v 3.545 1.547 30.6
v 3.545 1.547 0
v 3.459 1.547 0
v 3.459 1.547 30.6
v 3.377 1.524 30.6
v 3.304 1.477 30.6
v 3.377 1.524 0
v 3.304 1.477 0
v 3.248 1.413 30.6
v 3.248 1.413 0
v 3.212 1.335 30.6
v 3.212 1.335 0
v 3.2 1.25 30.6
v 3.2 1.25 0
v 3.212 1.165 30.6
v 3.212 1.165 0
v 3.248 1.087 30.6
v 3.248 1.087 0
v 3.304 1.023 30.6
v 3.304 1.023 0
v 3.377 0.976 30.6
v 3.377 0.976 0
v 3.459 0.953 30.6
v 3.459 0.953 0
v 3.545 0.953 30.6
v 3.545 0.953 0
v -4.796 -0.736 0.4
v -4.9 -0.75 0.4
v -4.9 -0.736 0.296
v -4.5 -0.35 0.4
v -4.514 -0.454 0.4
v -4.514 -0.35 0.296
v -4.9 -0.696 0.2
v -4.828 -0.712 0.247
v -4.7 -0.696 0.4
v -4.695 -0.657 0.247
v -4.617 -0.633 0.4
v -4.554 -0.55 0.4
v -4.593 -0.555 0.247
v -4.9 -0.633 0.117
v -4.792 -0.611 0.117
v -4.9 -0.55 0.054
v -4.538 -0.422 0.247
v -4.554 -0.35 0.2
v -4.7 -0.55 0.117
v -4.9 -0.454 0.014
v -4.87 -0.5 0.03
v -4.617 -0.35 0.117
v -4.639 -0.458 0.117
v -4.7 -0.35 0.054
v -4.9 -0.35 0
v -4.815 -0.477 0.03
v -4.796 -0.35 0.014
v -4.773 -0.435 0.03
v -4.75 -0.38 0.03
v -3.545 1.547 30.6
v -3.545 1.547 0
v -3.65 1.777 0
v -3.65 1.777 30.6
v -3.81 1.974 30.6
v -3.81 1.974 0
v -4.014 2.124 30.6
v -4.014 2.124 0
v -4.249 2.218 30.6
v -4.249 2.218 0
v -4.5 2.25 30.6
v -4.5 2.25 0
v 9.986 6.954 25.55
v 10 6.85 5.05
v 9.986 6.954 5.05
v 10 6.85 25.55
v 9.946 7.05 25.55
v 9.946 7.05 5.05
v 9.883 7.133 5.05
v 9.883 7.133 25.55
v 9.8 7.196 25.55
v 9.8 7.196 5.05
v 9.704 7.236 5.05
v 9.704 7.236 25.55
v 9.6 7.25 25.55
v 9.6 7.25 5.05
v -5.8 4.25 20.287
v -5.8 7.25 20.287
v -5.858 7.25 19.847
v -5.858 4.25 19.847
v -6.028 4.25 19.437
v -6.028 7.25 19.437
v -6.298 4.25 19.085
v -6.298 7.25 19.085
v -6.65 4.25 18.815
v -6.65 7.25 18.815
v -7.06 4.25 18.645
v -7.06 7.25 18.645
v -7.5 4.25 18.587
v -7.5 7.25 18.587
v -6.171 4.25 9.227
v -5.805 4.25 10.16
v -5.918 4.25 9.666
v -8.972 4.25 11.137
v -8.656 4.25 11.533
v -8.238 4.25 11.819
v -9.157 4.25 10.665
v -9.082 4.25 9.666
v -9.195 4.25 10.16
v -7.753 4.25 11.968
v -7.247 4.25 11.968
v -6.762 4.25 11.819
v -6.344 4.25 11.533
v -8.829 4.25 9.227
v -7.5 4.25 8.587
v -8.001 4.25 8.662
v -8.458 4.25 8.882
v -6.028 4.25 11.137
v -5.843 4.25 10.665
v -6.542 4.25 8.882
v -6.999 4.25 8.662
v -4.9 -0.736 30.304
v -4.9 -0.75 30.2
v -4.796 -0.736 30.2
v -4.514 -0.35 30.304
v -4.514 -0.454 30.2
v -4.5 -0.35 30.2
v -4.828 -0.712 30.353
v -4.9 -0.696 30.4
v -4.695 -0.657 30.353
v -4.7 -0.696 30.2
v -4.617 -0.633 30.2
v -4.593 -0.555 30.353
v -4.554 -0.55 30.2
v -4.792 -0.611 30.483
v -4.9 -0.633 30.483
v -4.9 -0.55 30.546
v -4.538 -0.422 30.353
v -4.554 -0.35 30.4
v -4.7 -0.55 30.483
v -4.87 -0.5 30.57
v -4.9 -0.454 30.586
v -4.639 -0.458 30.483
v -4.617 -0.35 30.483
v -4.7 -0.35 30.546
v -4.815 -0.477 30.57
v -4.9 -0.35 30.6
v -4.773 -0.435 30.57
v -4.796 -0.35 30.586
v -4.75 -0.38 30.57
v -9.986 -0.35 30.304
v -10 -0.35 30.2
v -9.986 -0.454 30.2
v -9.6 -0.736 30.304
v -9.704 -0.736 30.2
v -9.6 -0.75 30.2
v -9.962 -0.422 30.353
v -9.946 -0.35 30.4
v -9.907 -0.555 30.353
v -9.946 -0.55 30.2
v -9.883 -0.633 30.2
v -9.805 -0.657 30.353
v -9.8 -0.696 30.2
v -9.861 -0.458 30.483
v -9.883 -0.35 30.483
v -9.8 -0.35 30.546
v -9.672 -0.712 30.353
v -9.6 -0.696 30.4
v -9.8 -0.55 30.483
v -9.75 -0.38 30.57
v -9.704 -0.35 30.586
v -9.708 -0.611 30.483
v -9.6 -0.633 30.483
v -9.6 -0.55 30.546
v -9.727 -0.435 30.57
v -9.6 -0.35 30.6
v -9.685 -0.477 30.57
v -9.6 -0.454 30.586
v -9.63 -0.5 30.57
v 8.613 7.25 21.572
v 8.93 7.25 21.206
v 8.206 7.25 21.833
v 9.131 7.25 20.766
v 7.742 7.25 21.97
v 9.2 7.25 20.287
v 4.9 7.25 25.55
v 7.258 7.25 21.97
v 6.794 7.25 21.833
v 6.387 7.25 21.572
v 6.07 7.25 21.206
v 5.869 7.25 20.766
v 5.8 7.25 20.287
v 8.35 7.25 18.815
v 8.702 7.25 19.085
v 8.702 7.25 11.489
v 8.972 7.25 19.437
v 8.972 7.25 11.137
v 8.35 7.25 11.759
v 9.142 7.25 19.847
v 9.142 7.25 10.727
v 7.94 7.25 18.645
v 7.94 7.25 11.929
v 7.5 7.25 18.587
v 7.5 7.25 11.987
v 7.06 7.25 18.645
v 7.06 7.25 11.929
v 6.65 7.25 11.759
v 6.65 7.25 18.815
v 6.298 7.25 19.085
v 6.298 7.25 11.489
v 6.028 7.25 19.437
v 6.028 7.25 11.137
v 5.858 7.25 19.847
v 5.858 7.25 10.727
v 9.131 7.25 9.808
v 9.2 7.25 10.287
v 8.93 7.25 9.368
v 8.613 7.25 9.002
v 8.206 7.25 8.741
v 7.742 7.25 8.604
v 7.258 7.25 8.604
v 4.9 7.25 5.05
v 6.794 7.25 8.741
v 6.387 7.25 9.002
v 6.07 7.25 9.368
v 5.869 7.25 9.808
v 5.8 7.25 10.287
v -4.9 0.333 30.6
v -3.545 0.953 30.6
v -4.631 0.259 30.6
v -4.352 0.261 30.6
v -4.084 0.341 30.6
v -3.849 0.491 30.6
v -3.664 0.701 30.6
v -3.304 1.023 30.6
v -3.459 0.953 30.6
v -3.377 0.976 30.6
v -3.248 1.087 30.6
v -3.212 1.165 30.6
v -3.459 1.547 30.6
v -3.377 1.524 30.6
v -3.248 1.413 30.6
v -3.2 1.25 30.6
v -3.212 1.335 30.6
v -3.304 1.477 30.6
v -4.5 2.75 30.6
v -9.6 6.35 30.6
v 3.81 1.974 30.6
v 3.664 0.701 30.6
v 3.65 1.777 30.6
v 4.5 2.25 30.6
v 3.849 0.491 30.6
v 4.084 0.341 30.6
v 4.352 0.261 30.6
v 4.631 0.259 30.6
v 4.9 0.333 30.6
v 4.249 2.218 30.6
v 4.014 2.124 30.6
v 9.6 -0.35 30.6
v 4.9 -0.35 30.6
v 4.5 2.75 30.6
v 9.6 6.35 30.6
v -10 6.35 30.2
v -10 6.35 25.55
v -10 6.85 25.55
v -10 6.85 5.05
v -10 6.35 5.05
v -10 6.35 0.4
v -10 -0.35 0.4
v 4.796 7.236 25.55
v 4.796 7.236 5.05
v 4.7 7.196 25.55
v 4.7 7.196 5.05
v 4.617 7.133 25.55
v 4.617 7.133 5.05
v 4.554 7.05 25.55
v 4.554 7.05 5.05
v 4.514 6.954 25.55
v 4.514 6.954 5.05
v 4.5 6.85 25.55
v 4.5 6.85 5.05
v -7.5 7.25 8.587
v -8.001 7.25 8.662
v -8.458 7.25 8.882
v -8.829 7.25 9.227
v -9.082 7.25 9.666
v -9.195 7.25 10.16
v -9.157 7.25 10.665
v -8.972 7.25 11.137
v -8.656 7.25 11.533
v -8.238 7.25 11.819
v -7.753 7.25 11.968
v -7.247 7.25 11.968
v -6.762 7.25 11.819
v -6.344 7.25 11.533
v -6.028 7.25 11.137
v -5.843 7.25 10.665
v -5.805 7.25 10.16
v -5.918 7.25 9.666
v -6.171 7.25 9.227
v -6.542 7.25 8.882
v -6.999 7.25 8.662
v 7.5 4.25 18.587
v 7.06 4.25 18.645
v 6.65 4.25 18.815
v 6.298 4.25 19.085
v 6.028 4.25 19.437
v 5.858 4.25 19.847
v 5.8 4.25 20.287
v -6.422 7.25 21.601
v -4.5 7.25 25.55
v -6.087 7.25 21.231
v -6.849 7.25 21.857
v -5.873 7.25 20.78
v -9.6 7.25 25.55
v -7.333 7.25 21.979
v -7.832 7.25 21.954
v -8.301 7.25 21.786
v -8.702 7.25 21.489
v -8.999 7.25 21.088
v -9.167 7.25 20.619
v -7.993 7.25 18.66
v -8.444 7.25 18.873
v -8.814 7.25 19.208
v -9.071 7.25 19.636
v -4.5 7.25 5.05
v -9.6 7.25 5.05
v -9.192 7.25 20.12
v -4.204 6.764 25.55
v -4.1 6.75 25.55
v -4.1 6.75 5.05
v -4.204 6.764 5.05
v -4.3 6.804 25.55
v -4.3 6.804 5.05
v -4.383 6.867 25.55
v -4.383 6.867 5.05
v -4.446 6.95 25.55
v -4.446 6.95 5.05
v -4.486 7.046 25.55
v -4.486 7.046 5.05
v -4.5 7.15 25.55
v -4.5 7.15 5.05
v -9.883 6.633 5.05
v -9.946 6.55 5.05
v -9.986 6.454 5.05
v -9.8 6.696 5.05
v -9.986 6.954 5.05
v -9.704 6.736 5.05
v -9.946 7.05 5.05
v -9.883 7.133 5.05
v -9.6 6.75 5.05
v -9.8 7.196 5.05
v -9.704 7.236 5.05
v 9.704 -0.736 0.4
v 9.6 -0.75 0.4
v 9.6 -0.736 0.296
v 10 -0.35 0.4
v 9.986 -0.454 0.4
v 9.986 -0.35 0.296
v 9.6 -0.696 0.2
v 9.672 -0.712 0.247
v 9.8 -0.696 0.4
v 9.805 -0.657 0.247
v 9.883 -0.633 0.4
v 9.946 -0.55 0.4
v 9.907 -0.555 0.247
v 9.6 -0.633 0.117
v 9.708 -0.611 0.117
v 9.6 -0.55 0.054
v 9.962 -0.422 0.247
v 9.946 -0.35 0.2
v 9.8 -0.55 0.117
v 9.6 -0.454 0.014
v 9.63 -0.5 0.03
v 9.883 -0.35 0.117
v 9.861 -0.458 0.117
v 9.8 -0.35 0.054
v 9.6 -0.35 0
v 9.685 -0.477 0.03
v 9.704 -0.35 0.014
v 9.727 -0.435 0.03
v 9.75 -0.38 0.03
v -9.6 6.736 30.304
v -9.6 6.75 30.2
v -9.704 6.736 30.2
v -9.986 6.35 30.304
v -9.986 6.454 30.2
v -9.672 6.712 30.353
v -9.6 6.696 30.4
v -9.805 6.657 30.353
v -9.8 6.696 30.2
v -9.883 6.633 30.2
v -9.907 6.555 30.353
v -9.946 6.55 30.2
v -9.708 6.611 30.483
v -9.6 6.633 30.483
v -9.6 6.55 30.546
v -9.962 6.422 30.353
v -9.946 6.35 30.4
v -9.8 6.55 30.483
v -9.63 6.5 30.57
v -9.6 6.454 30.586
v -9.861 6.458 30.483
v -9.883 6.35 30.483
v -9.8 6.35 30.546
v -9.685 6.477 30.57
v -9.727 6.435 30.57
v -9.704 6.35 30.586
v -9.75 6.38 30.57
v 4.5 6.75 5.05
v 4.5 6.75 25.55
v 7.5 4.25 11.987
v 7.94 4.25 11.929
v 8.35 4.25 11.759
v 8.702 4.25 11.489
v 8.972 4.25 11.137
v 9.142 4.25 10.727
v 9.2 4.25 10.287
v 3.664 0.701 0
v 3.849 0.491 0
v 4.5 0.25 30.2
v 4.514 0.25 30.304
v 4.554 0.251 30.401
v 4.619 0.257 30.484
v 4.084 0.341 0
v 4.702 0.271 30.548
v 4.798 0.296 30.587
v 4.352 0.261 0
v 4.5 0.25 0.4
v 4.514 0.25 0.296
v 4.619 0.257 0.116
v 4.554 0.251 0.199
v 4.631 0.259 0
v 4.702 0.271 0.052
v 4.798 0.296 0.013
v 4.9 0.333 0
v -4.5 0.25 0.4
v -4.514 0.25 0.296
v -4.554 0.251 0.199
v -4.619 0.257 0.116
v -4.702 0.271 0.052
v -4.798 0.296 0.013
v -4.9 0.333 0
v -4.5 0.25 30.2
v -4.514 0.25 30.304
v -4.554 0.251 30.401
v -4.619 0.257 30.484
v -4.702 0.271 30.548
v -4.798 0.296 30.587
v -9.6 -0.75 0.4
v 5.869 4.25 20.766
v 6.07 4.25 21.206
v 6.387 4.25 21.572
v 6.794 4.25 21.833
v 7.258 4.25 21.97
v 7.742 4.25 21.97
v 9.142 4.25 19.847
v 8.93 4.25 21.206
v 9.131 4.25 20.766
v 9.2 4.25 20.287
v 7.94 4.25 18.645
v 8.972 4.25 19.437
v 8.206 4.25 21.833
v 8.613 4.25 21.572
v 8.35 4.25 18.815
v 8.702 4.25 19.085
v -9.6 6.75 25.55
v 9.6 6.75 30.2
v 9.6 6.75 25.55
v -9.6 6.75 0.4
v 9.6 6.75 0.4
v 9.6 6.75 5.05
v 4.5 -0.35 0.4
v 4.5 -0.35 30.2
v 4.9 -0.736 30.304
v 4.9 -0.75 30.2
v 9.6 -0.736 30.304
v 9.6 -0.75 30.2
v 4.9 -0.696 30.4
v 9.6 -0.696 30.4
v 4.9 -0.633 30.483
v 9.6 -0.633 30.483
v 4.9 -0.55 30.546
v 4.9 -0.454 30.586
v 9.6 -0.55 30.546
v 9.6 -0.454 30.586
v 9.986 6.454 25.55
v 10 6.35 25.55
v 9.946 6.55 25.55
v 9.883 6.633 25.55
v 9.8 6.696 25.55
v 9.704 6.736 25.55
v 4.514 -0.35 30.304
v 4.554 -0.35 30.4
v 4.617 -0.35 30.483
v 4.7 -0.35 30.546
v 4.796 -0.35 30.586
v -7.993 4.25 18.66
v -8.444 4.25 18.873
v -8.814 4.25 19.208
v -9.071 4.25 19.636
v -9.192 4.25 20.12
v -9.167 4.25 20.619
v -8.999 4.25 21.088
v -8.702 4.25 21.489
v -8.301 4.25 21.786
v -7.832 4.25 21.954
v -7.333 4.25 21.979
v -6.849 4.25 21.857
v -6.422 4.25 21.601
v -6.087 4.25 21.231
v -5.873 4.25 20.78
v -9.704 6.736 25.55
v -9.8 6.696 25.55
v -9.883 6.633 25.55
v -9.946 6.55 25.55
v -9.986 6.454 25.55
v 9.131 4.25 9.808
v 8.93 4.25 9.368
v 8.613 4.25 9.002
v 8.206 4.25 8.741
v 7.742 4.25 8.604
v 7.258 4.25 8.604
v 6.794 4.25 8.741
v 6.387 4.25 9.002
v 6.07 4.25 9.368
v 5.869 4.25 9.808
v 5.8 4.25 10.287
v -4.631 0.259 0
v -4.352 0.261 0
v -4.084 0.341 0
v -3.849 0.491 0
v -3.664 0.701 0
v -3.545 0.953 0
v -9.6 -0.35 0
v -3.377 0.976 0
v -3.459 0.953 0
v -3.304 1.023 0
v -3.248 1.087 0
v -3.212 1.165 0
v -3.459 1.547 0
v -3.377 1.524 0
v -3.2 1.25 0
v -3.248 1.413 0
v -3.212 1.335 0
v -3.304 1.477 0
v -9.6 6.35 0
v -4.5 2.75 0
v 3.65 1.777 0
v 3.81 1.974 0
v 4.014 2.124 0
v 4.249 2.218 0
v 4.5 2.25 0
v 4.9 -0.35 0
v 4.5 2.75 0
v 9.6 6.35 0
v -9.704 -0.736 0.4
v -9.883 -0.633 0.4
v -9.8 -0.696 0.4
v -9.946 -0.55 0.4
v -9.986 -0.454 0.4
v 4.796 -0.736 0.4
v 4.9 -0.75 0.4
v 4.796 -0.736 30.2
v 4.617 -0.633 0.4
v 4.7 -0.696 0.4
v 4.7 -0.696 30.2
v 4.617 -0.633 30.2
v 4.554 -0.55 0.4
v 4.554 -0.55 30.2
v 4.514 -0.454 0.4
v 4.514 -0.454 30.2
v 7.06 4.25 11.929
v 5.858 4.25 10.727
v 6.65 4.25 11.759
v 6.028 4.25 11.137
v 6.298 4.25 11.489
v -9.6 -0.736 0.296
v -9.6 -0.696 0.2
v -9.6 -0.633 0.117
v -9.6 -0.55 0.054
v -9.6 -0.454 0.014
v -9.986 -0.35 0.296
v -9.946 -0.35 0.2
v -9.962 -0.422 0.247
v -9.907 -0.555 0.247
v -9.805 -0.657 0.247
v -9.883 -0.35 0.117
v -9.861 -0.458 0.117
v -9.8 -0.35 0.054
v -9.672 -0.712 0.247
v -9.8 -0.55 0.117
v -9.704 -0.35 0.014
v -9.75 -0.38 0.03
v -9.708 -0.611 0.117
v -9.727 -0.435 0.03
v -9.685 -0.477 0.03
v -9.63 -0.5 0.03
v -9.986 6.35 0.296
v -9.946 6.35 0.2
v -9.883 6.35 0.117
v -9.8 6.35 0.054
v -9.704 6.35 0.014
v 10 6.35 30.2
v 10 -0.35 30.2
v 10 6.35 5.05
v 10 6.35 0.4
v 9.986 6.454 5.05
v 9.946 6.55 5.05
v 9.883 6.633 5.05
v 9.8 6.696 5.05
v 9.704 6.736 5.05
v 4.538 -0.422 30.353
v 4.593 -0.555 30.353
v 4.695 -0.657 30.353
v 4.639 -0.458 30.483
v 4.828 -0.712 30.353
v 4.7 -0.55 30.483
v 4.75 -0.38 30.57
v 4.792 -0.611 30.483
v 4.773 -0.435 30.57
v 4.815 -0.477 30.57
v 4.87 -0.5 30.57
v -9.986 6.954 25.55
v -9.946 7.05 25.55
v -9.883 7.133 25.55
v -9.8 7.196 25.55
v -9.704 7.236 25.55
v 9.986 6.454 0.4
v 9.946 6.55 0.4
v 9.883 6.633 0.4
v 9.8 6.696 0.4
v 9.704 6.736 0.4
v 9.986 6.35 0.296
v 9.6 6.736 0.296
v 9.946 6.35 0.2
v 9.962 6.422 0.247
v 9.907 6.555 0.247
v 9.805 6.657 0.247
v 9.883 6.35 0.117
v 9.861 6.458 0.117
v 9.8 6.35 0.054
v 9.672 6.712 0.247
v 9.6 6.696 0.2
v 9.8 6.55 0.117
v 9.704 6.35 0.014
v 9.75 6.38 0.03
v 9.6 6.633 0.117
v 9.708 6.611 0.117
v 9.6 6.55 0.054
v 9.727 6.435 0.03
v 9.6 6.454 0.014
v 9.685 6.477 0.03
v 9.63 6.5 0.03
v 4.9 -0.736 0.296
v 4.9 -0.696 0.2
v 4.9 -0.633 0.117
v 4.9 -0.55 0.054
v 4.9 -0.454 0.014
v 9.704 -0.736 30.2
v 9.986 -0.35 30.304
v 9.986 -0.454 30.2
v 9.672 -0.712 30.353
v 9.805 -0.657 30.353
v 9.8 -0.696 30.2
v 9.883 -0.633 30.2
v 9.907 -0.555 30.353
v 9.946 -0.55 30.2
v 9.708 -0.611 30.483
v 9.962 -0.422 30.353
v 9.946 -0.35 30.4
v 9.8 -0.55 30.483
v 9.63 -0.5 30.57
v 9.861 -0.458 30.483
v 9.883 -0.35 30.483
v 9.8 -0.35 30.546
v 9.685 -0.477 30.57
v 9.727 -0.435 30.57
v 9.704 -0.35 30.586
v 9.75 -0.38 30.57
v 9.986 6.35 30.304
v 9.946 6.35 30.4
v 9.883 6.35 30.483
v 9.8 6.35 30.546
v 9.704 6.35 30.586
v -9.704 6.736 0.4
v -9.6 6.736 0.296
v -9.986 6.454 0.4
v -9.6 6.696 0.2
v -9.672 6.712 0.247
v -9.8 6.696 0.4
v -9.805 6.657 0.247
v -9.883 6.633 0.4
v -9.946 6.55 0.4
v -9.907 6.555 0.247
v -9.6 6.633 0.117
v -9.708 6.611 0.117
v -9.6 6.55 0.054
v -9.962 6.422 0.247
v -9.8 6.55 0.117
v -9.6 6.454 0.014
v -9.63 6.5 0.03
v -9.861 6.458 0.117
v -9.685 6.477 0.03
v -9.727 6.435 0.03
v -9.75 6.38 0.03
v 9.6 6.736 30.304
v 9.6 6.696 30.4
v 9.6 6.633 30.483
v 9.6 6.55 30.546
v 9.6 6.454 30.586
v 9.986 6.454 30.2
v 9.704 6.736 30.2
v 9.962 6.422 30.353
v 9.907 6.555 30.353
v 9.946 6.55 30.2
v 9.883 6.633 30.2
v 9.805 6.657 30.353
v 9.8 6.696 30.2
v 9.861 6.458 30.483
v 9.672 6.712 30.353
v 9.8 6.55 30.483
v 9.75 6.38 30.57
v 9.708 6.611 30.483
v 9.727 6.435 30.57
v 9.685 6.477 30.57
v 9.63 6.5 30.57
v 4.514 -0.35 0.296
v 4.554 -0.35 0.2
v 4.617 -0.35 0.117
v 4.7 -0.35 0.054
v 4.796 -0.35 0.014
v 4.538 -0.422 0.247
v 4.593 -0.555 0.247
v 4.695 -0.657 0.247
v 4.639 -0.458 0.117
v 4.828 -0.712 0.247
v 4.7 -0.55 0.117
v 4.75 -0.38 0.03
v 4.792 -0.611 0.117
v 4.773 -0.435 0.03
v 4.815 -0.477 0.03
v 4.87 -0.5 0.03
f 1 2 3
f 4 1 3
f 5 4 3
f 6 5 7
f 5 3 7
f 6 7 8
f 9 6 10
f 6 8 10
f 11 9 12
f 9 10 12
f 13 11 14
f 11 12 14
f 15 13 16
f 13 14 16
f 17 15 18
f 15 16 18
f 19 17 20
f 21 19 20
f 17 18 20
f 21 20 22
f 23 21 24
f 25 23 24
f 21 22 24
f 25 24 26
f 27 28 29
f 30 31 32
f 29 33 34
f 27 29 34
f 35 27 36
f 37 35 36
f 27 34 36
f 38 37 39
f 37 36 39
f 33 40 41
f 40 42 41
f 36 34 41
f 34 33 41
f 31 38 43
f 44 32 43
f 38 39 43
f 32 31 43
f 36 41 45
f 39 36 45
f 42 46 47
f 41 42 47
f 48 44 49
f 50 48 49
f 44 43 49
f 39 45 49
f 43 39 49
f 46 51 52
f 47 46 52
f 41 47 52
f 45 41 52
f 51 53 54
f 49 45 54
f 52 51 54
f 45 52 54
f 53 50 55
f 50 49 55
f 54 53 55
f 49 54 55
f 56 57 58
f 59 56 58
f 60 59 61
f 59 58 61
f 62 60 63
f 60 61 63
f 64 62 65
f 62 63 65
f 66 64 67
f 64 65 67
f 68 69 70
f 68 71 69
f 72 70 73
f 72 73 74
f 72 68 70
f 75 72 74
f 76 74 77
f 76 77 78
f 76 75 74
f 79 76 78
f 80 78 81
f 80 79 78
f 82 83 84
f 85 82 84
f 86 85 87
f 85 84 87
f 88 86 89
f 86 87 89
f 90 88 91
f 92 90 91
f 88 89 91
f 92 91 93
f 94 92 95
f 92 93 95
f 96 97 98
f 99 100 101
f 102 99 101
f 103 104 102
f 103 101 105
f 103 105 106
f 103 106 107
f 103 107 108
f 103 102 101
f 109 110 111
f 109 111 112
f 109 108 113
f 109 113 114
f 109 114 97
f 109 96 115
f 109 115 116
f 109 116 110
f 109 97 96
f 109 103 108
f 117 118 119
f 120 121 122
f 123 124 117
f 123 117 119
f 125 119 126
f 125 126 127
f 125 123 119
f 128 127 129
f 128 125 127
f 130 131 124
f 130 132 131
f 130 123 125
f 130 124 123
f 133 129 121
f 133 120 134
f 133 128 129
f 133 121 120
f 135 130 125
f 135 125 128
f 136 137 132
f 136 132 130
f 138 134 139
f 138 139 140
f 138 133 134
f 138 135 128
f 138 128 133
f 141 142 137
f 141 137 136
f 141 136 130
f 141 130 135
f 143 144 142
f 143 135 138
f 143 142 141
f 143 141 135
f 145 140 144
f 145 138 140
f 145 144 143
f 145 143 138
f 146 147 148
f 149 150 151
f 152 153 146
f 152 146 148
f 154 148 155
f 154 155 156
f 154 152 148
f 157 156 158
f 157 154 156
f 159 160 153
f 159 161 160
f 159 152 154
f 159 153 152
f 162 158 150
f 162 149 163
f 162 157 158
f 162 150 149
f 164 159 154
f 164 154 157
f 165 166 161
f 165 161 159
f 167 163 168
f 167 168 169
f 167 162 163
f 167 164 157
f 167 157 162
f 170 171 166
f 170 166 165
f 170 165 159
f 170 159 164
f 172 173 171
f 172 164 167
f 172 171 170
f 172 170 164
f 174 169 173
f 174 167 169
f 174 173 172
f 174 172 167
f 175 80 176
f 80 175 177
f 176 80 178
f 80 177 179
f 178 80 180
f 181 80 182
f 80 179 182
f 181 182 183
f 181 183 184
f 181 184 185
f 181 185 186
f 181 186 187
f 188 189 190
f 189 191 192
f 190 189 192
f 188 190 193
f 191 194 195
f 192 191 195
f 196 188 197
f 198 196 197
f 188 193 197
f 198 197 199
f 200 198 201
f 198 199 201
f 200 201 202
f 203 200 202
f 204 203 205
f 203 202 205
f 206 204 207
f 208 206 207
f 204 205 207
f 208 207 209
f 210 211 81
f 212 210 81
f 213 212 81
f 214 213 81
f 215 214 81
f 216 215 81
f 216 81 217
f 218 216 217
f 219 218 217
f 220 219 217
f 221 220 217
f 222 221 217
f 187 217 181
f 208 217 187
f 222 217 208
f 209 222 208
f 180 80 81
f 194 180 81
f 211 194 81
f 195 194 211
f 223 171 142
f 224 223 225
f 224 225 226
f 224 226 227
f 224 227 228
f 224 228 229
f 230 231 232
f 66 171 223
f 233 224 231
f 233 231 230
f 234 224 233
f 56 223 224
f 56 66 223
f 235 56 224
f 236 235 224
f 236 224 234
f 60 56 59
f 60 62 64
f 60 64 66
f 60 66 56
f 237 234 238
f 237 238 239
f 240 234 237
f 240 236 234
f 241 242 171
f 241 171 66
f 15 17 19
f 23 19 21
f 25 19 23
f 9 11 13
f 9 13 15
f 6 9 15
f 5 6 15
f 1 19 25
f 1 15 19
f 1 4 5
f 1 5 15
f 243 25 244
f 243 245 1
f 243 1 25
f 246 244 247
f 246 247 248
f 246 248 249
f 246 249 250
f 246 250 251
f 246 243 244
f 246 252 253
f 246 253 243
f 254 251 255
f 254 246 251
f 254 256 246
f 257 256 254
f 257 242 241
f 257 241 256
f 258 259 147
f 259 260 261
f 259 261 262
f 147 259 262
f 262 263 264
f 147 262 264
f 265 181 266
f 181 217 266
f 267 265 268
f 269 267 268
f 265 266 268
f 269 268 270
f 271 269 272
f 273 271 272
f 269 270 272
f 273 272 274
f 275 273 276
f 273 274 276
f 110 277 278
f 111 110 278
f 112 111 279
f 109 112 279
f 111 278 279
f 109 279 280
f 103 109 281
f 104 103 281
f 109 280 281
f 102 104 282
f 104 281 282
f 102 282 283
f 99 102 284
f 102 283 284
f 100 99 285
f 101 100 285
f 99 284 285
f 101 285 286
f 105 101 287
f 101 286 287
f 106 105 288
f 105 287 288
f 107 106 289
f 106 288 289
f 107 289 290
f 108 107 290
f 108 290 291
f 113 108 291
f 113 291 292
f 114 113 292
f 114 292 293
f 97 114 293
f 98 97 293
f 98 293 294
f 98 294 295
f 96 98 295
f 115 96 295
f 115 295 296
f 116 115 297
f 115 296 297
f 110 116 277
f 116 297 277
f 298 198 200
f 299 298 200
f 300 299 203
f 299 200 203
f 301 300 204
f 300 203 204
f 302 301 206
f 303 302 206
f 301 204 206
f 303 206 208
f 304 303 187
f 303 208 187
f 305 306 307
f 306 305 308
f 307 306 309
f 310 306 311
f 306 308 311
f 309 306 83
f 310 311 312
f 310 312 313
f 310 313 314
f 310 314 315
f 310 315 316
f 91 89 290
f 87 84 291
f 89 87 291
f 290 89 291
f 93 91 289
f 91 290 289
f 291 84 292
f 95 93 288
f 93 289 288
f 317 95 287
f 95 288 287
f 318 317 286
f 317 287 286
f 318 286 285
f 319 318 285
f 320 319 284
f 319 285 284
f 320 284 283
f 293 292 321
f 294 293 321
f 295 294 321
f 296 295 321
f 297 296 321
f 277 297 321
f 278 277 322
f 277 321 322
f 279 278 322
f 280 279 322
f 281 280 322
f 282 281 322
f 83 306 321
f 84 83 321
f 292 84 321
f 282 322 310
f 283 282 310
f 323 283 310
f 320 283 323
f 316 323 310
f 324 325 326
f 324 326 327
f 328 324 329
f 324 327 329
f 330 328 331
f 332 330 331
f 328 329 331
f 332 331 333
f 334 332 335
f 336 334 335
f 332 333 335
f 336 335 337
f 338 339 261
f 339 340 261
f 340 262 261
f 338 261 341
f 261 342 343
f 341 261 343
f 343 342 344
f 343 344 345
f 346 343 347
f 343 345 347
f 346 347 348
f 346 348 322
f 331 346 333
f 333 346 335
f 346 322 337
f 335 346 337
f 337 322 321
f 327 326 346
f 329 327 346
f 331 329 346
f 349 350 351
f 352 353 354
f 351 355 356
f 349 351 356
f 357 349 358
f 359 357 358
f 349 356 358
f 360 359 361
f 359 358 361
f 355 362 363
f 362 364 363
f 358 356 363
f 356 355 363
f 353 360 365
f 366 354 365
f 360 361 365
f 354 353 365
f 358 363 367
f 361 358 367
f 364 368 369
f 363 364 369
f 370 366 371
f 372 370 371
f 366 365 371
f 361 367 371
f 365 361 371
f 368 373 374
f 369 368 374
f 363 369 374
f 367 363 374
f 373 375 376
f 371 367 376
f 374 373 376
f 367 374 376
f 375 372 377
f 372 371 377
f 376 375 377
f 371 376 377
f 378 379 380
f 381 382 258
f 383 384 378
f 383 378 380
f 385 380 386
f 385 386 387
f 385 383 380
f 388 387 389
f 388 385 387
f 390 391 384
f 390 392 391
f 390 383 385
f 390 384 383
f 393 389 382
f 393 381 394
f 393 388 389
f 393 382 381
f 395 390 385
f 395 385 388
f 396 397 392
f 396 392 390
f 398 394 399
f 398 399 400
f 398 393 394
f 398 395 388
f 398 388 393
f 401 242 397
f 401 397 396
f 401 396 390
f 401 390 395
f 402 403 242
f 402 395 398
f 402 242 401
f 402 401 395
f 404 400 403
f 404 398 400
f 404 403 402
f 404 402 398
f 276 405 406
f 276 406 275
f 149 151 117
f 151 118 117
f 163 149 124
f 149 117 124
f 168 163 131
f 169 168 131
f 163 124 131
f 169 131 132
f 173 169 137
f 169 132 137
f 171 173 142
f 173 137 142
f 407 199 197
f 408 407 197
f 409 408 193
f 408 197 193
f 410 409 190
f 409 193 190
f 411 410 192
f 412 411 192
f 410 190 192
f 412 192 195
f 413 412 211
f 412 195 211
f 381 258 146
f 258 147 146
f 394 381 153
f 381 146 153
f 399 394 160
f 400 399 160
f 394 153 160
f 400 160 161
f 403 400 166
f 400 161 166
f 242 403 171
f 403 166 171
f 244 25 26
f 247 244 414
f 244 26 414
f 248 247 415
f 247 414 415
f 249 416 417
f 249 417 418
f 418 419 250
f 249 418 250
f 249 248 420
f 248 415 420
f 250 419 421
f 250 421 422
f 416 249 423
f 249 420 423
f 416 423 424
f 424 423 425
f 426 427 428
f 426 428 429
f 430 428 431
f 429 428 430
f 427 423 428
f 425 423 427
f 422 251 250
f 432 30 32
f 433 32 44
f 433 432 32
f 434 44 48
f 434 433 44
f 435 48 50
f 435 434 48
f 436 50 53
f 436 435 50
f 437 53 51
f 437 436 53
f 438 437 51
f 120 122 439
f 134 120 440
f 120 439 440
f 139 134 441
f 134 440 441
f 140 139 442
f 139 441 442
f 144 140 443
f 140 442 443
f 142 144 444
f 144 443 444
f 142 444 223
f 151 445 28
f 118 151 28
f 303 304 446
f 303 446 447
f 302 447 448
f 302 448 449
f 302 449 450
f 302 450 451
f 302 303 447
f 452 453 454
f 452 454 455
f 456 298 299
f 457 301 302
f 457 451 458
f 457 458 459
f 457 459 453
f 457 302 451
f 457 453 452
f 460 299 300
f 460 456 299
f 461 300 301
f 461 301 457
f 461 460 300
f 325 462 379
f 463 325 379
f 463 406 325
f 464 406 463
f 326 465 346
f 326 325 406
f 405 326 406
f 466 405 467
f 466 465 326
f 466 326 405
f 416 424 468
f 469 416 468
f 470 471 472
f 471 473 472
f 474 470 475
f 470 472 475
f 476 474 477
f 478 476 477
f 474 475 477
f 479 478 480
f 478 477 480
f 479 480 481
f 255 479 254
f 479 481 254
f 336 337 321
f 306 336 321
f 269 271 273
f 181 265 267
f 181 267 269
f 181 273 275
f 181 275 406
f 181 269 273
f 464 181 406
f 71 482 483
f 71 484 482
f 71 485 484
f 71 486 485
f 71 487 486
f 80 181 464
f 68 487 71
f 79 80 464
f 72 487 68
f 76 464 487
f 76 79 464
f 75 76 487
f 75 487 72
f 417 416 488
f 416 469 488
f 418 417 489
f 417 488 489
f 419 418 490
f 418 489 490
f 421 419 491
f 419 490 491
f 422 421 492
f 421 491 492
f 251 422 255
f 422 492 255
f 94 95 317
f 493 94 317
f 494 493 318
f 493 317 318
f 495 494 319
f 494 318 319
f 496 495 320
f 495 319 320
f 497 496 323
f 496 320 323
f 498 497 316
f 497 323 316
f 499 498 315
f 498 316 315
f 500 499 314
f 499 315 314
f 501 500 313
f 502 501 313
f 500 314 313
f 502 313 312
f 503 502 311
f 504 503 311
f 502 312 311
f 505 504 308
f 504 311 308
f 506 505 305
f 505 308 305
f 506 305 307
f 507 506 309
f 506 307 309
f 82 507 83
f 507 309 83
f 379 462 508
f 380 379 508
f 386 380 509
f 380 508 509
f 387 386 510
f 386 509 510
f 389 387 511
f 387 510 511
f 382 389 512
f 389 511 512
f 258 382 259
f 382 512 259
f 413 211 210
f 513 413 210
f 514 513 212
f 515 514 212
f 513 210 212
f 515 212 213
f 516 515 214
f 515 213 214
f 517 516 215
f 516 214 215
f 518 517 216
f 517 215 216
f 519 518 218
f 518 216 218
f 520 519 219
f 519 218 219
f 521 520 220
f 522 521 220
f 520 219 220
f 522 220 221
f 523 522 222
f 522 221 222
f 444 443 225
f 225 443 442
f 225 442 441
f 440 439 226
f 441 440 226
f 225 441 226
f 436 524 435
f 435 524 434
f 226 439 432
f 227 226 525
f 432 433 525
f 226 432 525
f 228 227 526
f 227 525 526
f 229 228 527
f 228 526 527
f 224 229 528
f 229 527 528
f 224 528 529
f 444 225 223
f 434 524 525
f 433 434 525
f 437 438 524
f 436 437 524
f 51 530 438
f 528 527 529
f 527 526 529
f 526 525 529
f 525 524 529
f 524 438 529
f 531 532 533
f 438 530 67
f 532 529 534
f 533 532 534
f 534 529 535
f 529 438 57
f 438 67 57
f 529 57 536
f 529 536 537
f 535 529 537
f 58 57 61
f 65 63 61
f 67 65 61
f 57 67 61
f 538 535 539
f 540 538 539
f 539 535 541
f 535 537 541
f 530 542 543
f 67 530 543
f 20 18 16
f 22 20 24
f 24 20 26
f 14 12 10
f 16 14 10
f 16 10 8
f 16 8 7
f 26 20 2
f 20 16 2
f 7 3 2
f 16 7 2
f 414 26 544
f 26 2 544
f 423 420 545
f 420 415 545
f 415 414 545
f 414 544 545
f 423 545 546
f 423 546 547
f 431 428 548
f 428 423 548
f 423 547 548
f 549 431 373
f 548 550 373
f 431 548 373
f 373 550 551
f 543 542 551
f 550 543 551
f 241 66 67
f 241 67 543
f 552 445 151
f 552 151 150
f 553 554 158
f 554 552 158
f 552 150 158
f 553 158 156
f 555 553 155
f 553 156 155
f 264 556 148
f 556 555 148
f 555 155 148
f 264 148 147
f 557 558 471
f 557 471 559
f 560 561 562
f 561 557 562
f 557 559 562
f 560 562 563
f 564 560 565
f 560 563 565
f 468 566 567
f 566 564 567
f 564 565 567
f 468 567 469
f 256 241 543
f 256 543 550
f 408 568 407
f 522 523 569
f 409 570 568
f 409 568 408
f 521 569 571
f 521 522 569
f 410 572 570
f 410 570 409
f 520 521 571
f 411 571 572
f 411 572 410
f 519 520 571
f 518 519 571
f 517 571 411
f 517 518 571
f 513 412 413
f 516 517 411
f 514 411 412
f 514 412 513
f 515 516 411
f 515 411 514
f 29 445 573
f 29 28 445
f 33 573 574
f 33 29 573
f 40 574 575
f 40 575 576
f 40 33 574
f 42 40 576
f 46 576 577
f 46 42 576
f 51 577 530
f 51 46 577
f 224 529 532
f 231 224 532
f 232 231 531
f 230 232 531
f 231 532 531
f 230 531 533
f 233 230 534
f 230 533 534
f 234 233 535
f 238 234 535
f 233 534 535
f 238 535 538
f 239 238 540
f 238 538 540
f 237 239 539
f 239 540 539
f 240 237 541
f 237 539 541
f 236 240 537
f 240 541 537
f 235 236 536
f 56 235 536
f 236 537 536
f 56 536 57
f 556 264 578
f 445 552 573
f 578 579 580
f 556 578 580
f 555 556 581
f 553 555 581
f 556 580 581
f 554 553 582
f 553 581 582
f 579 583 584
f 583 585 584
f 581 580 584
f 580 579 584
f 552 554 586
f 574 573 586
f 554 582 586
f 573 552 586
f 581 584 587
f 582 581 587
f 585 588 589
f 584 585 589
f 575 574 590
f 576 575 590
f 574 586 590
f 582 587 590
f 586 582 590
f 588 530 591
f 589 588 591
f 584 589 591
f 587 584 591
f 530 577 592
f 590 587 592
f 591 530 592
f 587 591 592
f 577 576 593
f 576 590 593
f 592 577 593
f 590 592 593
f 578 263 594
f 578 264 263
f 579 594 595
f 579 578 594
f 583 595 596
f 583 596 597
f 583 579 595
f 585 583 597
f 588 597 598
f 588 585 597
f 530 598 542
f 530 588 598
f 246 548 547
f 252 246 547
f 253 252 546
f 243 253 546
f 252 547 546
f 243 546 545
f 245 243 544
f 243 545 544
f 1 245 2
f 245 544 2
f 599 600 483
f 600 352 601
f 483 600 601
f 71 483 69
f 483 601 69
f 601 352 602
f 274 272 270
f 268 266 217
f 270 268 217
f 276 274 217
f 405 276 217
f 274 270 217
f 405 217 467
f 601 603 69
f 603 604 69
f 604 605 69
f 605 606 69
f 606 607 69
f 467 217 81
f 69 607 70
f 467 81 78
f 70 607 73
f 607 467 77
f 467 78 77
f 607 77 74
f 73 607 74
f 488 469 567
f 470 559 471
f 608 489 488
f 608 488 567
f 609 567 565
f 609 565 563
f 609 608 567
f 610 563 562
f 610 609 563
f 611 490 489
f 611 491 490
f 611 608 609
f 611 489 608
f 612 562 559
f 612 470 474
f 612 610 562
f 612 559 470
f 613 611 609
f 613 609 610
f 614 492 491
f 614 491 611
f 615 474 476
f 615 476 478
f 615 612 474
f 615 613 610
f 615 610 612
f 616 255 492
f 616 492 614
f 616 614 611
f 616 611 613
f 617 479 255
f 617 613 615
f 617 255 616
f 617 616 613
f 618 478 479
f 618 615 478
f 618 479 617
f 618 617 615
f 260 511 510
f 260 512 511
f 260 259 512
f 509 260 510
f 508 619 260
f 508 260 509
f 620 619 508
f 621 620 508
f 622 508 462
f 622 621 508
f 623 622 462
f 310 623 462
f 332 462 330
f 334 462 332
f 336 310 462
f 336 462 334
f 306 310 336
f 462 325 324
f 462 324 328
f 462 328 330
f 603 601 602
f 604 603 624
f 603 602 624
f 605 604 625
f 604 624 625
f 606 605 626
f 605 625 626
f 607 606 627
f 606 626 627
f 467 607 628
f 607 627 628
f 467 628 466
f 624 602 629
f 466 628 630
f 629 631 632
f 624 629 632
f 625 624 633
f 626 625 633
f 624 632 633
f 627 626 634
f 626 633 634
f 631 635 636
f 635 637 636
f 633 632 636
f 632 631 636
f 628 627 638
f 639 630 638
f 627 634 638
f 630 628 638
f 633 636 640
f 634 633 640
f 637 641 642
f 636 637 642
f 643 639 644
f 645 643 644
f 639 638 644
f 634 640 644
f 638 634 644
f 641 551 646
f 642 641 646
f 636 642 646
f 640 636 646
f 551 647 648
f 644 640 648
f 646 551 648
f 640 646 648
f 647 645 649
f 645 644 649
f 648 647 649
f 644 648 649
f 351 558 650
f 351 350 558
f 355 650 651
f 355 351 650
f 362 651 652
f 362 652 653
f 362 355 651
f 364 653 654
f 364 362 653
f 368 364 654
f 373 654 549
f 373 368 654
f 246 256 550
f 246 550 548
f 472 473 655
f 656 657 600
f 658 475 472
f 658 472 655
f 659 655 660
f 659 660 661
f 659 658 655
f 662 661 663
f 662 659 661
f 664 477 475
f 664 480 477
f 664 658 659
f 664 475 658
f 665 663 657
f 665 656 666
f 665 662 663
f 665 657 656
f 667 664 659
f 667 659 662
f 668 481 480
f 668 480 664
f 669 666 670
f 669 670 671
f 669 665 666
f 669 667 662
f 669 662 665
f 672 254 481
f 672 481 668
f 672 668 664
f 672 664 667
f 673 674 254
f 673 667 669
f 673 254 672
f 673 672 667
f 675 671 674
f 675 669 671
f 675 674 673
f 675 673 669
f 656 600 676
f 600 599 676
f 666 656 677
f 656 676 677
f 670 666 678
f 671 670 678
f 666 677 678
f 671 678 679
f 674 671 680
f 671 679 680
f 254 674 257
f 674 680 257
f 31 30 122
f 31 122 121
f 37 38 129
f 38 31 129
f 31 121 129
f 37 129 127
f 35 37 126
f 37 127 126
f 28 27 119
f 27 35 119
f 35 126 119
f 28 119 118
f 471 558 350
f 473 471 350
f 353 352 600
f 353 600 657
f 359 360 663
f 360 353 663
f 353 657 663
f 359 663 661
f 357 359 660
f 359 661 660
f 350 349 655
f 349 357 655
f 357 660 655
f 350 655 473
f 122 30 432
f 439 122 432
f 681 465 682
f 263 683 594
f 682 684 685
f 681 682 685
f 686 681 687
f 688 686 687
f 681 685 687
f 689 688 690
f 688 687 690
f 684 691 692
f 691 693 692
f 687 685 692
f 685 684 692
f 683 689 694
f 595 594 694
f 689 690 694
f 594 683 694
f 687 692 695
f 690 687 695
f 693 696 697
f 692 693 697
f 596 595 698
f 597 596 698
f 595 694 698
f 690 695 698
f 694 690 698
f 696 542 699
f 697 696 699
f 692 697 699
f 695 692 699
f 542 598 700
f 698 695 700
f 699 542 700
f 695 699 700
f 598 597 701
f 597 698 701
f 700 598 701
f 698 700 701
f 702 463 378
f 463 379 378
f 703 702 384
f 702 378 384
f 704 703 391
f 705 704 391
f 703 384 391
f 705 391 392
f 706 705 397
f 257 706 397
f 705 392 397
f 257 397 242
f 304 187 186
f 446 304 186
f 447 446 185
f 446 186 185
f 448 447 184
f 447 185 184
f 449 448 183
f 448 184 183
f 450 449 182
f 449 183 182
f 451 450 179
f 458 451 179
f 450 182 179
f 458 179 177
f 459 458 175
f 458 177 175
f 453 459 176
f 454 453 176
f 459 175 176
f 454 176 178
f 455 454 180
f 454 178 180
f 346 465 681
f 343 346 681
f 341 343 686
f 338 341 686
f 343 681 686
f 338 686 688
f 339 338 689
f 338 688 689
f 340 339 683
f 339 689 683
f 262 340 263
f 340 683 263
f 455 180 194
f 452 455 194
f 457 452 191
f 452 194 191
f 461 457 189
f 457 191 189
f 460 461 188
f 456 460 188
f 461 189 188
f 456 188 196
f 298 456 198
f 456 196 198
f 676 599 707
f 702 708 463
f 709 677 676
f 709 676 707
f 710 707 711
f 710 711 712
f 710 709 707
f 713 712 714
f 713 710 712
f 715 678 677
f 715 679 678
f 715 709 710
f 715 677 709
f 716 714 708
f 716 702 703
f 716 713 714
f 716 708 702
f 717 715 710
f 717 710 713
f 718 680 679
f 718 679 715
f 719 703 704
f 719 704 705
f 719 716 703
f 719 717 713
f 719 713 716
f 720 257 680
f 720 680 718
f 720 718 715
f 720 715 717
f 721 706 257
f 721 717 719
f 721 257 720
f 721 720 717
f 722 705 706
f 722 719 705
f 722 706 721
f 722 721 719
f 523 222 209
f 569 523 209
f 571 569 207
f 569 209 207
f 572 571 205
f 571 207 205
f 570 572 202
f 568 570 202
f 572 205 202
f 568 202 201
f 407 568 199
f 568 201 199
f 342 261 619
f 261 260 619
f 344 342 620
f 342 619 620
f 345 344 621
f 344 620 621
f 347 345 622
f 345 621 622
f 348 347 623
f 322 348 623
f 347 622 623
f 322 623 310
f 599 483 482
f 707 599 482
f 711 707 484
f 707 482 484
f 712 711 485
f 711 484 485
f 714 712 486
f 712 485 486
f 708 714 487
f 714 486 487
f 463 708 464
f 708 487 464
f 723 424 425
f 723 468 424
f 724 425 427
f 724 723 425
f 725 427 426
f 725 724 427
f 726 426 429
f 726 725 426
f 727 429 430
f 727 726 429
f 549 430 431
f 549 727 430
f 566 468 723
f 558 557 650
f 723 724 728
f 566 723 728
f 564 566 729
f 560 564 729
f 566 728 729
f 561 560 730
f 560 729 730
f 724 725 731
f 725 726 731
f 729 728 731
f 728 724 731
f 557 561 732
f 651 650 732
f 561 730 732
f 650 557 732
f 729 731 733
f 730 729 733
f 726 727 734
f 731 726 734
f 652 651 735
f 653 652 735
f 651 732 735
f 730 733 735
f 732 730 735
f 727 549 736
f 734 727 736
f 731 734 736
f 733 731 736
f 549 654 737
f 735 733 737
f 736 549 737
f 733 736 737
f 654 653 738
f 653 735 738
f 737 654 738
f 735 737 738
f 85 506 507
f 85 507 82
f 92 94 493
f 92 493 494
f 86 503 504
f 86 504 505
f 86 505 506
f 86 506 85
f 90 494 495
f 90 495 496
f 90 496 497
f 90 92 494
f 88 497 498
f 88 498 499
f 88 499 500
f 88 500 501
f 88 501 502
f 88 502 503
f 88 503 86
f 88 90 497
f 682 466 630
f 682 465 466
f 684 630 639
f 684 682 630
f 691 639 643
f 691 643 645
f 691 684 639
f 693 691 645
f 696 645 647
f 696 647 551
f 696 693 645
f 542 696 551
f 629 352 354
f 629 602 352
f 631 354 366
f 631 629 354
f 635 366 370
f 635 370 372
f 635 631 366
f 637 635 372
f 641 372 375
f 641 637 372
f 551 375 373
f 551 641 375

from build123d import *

# Parameters (mm, degrees)
SKETCH1_R           = 1
SKETCH1_R_2         = 0.3
BOSS_EXTRUDE1_DEPTH = 30.6
SKETCH2_W           = 20
SKETCH2_H           = 5.05
CUT_EXTRUDE1_DEPTH  = 0.5
SKETCH4_W           = 4.5
SKETCH4_H           = 0.5
CUT_EXTRUDE2_DEPTH  = 21.5
SKETCH5_R           = 1.7
CUT_EXTRUDE3_DEPTH  = 3
FILLET1_R           = 0.4
FILLET2_R           = 0.4


with BuildPart() as part:
    # Sketch1 → Boss-Extrude1 (new body)
    with BuildSketch(Plane.XY):
        with BuildLine():
            Line((-4.5, 2.25), (-4.5, 2.75))
            Line((-4.5, 2.75), (4.5, 2.75))
            Line((4.5, 2.75), (4.5, 2.25))
            ThreePointArc((4.5, 2.25), (5.207106781, 1.957106781), (5.5, 1.25))
            ThreePointArc((5.5, 1.25), (5.207106781, 0.542893219), (4.5, 0.25))
            Line((4.5, 0.25), (4.5, -0.75))
            Line((4.5, -0.75), (10, -0.75))
            Line((10, -0.75), (10, 7.25))
            Line((10, 7.25), (-10, 7.25))
            Line((-10, 7.25), (-10, -0.75))
            Line((-10, -0.75), (-4.5, -0.75))
            Line((-4.5, -0.75), (-4.5, 0.25))
            ThreePointArc((-4.5, 0.25), (-5.5, 1.25), (-4.5, 2.25))
        make_face()
        with BuildLine():
            Line((-4.5, 1.25), (-4.5, 2.25))
            ThreePointArc((-4.5, 2.25), (-5.5, 1.25), (-4.5, 0.25))
            Line((-4.5, 0.25), (-4.5, 1.25))
        make_face()
        with BuildLine():
            ThreePointArc((-3.545, 1.546605799), (-3.906959444, 2.05517259), (-4.5, 2.25))
            Line((-4.5, 2.25), (-4.5, 1.25))
            Line((-4.5, 1.25), (-4.5, 0.25))
            ThreePointArc((-4.5, 0.25), (-3.906959444, 0.44482741), (-3.545, 0.953394201))
            ThreePointArc((-3.545, 0.953394201), (-3.8, 1.25), (-3.545, 1.546605799))
        make_face()
        with Locations((-4.5, 1.25)):
            Circle(SKETCH1_R)
        with Locations((-3.5, 1.25)):
            Circle(SKETCH1_R_2)
        with Locations((3.5, 1.25)):
            Circle(SKETCH1_R_2)
        with Locations((4.5, 1.25)):
            Circle(SKETCH1_R)
        with BuildLine():
            Line((4.5, 0.25), (4.5, 2.25))
            ThreePointArc((4.5, 2.25), (3.906959444, 2.05517259), (3.545, 1.546605799))
            ThreePointArc((3.545, 1.546605799), (3.727486263, 1.445576072), (3.8, 1.25))
            ThreePointArc((3.8, 1.25), (3.727486263, 1.054423928), (3.545, 0.953394201))
            ThreePointArc((3.545, 0.953394201), (3.906959444, 0.44482741), (4.5, 0.25))
        make_face()
        with BuildLine():
            ThreePointArc((5.5, 1.25), (5.207106781, 1.957106781), (4.5, 2.25))
            Line((4.5, 2.25), (4.5, 0.25))
            ThreePointArc((4.5, 0.25), (5.207106781, 0.542893219), (5.5, 1.25))
        make_face()
    extrude(amount=BOSS_EXTRUDE1_DEPTH)

    # Sketch2 → Cut-Extrude1 (cut)
    with BuildSketch(Plane(origin=(0, 7.25, 0), x_dir=(1, 0, 0), z_dir=(0, 1, 0))):
        with Locations((0, -2.525)):
            Rectangle(SKETCH2_W, SKETCH2_H)
        with Locations((0, -28.075)):
            Rectangle(SKETCH2_W, SKETCH2_H)
    extrude(amount=-CUT_EXTRUDE1_DEPTH, mode=Mode.SUBTRACT)

    # Sketch4 → Cut-Extrude2 (cut)
    with BuildSketch(Plane.XY.offset(25.55)):
        with Locations((-2.25, 7)):
            Rectangle(SKETCH4_W, SKETCH4_H)
        with Locations((2.25, 7)):
            Rectangle(SKETCH4_W, SKETCH4_H)
    extrude(amount=-CUT_EXTRUDE2_DEPTH, mode=Mode.SUBTRACT)

    # Sketch5 → Cut-Extrude3 (cut)
    with BuildSketch(Plane(origin=(0, 7.25, 0), x_dir=(1, 0, 0), z_dir=(0, 1, 0))):
        with BuildLine():
            ThreePointArc((-7.5, -18.586900159), (-8.702081528, -21.488981687), (-5.8, -20.286900159))
            Line((-5.8, -20.286900159), (-7.5, -20.286900159))
            Line((-7.5, -20.286900159), (-7.5, -18.586900159))
        make_face()
        with BuildLine():
            Line((-7.5, -20.286900159), (-5.8, -20.286900159))
            ThreePointArc((-5.8, -20.286900159), (-6.297918472, -19.084818631), (-7.5, -18.586900159))
            Line((-7.5, -18.586900159), (-7.5, -20.286900159))
        make_face()
        with BuildLine():
            ThreePointArc((7.5, -18.586900159), (6.297918472, -19.084818631), (5.8, -20.286900159))
            Line((5.8, -20.286900159), (7.5, -20.286900159))
            Line((7.5, -20.286900159), (7.5, -18.586900159))
        make_face()
        with BuildLine():
            Line((7.5, -20.286900159), (5.8, -20.286900159))
            ThreePointArc((5.8, -20.286900159), (7.5, -21.986900159), (9.2, -20.286900159))
            ThreePointArc((9.2, -20.286900159), (8.702081528, -19.084818631), (7.5, -18.586900159))
            Line((7.5, -18.586900159), (7.5, -20.286900159))
        make_face()
        with BuildLine():
            ThreePointArc((9.2, -10.286900159), (7.5, -8.586900159), (5.8, -10.286900159))
            Line((5.8, -10.286900159), (7.5, -10.286900159))
            Line((7.5, -10.286900159), (7.5, -11.986900159))
            ThreePointArc((7.5, -11.986900159), (8.702081528, -11.488981687), (9.2, -10.286900159))
        make_face()
        with BuildLine():
            Line((7.5, -10.286900159), (5.8, -10.286900159))
            ThreePointArc((5.8, -10.286900159), (6.297918472, -11.488981687), (7.5, -11.986900159))
            Line((7.5, -11.986900159), (7.5, -10.286900159))
        make_face()
        with Locations(Location((-7.5, -10.286900159, 0), (0, 0, 90))):
            Circle(SKETCH5_R)
    extrude(amount=-CUT_EXTRUDE3_DEPTH, mode=Mode.SUBTRACT)

    # Fillet1
    fillet1_edges = [part.edges().sort_by_distance(p)[0] for p in [
        (-4.5, -0.75, 15.3),
        (-10, -0.75, 15.3),
        (10, -0.75, 15.3),
        (4.5, -0.75, 15.3),
        (-10, 7.25, 15.3),
        (10, 7.25, 15.3),
        (-10, 6.75, 2.525),
        (10, 6.75, 2.525),
        (10, 6.75, 28.075),
        (-10, 6.75, 28.075),
        (-4.5, 6.75, 15.3),
        (4.5, 7.25, 15.3),
    ]]
    fillet(fillet1_edges, radius=FILLET1_R)

    # Fillet2
    fillet2_edges = [part.edges().sort_by_distance(p)[0] for p in [
        (7.25, -0.75, 0),
        (7.25, -0.75, 30.6),
        (0, 6.75, 0),
        (10, 3, 0),
        (4.5, -0.05, 0),
        (-4.5, -0.05, 0),
        (-7.25, -0.75, 0),
        (-10, 3, 0),
        (-9.882842712, 6.632842712, 0),
        (9.882842712, 6.632842712, 0),
        (-9.882842712, -0.632842712, 0),
        (-4.617157288, -0.632842712, 0),
        (9.882842712, -0.632842712, 0),
        (4.617157288, -0.632842712, 0),
        (4.5, -0.05, 30.6),
        (10, 3, 30.6),
        (0, 6.75, 30.6),
        (-10, 3, 30.6),
        (-7.25, -0.75, 30.6),
        (-4.5, -0.05, 30.6),
        (-9.882842712, 6.632842712, 30.6),
        (9.882842712, 6.632842712, 30.6),
        (-9.882842712, -0.632842712, 30.6),
        (-4.617157288, -0.632842712, 30.6),
        (9.882842712, -0.632842712, 30.6),
        (4.617157288, -0.632842712, 30.6),
    ]]
    fillet(fillet2_edges, radius=FILLET2_R)


solid = part.part
